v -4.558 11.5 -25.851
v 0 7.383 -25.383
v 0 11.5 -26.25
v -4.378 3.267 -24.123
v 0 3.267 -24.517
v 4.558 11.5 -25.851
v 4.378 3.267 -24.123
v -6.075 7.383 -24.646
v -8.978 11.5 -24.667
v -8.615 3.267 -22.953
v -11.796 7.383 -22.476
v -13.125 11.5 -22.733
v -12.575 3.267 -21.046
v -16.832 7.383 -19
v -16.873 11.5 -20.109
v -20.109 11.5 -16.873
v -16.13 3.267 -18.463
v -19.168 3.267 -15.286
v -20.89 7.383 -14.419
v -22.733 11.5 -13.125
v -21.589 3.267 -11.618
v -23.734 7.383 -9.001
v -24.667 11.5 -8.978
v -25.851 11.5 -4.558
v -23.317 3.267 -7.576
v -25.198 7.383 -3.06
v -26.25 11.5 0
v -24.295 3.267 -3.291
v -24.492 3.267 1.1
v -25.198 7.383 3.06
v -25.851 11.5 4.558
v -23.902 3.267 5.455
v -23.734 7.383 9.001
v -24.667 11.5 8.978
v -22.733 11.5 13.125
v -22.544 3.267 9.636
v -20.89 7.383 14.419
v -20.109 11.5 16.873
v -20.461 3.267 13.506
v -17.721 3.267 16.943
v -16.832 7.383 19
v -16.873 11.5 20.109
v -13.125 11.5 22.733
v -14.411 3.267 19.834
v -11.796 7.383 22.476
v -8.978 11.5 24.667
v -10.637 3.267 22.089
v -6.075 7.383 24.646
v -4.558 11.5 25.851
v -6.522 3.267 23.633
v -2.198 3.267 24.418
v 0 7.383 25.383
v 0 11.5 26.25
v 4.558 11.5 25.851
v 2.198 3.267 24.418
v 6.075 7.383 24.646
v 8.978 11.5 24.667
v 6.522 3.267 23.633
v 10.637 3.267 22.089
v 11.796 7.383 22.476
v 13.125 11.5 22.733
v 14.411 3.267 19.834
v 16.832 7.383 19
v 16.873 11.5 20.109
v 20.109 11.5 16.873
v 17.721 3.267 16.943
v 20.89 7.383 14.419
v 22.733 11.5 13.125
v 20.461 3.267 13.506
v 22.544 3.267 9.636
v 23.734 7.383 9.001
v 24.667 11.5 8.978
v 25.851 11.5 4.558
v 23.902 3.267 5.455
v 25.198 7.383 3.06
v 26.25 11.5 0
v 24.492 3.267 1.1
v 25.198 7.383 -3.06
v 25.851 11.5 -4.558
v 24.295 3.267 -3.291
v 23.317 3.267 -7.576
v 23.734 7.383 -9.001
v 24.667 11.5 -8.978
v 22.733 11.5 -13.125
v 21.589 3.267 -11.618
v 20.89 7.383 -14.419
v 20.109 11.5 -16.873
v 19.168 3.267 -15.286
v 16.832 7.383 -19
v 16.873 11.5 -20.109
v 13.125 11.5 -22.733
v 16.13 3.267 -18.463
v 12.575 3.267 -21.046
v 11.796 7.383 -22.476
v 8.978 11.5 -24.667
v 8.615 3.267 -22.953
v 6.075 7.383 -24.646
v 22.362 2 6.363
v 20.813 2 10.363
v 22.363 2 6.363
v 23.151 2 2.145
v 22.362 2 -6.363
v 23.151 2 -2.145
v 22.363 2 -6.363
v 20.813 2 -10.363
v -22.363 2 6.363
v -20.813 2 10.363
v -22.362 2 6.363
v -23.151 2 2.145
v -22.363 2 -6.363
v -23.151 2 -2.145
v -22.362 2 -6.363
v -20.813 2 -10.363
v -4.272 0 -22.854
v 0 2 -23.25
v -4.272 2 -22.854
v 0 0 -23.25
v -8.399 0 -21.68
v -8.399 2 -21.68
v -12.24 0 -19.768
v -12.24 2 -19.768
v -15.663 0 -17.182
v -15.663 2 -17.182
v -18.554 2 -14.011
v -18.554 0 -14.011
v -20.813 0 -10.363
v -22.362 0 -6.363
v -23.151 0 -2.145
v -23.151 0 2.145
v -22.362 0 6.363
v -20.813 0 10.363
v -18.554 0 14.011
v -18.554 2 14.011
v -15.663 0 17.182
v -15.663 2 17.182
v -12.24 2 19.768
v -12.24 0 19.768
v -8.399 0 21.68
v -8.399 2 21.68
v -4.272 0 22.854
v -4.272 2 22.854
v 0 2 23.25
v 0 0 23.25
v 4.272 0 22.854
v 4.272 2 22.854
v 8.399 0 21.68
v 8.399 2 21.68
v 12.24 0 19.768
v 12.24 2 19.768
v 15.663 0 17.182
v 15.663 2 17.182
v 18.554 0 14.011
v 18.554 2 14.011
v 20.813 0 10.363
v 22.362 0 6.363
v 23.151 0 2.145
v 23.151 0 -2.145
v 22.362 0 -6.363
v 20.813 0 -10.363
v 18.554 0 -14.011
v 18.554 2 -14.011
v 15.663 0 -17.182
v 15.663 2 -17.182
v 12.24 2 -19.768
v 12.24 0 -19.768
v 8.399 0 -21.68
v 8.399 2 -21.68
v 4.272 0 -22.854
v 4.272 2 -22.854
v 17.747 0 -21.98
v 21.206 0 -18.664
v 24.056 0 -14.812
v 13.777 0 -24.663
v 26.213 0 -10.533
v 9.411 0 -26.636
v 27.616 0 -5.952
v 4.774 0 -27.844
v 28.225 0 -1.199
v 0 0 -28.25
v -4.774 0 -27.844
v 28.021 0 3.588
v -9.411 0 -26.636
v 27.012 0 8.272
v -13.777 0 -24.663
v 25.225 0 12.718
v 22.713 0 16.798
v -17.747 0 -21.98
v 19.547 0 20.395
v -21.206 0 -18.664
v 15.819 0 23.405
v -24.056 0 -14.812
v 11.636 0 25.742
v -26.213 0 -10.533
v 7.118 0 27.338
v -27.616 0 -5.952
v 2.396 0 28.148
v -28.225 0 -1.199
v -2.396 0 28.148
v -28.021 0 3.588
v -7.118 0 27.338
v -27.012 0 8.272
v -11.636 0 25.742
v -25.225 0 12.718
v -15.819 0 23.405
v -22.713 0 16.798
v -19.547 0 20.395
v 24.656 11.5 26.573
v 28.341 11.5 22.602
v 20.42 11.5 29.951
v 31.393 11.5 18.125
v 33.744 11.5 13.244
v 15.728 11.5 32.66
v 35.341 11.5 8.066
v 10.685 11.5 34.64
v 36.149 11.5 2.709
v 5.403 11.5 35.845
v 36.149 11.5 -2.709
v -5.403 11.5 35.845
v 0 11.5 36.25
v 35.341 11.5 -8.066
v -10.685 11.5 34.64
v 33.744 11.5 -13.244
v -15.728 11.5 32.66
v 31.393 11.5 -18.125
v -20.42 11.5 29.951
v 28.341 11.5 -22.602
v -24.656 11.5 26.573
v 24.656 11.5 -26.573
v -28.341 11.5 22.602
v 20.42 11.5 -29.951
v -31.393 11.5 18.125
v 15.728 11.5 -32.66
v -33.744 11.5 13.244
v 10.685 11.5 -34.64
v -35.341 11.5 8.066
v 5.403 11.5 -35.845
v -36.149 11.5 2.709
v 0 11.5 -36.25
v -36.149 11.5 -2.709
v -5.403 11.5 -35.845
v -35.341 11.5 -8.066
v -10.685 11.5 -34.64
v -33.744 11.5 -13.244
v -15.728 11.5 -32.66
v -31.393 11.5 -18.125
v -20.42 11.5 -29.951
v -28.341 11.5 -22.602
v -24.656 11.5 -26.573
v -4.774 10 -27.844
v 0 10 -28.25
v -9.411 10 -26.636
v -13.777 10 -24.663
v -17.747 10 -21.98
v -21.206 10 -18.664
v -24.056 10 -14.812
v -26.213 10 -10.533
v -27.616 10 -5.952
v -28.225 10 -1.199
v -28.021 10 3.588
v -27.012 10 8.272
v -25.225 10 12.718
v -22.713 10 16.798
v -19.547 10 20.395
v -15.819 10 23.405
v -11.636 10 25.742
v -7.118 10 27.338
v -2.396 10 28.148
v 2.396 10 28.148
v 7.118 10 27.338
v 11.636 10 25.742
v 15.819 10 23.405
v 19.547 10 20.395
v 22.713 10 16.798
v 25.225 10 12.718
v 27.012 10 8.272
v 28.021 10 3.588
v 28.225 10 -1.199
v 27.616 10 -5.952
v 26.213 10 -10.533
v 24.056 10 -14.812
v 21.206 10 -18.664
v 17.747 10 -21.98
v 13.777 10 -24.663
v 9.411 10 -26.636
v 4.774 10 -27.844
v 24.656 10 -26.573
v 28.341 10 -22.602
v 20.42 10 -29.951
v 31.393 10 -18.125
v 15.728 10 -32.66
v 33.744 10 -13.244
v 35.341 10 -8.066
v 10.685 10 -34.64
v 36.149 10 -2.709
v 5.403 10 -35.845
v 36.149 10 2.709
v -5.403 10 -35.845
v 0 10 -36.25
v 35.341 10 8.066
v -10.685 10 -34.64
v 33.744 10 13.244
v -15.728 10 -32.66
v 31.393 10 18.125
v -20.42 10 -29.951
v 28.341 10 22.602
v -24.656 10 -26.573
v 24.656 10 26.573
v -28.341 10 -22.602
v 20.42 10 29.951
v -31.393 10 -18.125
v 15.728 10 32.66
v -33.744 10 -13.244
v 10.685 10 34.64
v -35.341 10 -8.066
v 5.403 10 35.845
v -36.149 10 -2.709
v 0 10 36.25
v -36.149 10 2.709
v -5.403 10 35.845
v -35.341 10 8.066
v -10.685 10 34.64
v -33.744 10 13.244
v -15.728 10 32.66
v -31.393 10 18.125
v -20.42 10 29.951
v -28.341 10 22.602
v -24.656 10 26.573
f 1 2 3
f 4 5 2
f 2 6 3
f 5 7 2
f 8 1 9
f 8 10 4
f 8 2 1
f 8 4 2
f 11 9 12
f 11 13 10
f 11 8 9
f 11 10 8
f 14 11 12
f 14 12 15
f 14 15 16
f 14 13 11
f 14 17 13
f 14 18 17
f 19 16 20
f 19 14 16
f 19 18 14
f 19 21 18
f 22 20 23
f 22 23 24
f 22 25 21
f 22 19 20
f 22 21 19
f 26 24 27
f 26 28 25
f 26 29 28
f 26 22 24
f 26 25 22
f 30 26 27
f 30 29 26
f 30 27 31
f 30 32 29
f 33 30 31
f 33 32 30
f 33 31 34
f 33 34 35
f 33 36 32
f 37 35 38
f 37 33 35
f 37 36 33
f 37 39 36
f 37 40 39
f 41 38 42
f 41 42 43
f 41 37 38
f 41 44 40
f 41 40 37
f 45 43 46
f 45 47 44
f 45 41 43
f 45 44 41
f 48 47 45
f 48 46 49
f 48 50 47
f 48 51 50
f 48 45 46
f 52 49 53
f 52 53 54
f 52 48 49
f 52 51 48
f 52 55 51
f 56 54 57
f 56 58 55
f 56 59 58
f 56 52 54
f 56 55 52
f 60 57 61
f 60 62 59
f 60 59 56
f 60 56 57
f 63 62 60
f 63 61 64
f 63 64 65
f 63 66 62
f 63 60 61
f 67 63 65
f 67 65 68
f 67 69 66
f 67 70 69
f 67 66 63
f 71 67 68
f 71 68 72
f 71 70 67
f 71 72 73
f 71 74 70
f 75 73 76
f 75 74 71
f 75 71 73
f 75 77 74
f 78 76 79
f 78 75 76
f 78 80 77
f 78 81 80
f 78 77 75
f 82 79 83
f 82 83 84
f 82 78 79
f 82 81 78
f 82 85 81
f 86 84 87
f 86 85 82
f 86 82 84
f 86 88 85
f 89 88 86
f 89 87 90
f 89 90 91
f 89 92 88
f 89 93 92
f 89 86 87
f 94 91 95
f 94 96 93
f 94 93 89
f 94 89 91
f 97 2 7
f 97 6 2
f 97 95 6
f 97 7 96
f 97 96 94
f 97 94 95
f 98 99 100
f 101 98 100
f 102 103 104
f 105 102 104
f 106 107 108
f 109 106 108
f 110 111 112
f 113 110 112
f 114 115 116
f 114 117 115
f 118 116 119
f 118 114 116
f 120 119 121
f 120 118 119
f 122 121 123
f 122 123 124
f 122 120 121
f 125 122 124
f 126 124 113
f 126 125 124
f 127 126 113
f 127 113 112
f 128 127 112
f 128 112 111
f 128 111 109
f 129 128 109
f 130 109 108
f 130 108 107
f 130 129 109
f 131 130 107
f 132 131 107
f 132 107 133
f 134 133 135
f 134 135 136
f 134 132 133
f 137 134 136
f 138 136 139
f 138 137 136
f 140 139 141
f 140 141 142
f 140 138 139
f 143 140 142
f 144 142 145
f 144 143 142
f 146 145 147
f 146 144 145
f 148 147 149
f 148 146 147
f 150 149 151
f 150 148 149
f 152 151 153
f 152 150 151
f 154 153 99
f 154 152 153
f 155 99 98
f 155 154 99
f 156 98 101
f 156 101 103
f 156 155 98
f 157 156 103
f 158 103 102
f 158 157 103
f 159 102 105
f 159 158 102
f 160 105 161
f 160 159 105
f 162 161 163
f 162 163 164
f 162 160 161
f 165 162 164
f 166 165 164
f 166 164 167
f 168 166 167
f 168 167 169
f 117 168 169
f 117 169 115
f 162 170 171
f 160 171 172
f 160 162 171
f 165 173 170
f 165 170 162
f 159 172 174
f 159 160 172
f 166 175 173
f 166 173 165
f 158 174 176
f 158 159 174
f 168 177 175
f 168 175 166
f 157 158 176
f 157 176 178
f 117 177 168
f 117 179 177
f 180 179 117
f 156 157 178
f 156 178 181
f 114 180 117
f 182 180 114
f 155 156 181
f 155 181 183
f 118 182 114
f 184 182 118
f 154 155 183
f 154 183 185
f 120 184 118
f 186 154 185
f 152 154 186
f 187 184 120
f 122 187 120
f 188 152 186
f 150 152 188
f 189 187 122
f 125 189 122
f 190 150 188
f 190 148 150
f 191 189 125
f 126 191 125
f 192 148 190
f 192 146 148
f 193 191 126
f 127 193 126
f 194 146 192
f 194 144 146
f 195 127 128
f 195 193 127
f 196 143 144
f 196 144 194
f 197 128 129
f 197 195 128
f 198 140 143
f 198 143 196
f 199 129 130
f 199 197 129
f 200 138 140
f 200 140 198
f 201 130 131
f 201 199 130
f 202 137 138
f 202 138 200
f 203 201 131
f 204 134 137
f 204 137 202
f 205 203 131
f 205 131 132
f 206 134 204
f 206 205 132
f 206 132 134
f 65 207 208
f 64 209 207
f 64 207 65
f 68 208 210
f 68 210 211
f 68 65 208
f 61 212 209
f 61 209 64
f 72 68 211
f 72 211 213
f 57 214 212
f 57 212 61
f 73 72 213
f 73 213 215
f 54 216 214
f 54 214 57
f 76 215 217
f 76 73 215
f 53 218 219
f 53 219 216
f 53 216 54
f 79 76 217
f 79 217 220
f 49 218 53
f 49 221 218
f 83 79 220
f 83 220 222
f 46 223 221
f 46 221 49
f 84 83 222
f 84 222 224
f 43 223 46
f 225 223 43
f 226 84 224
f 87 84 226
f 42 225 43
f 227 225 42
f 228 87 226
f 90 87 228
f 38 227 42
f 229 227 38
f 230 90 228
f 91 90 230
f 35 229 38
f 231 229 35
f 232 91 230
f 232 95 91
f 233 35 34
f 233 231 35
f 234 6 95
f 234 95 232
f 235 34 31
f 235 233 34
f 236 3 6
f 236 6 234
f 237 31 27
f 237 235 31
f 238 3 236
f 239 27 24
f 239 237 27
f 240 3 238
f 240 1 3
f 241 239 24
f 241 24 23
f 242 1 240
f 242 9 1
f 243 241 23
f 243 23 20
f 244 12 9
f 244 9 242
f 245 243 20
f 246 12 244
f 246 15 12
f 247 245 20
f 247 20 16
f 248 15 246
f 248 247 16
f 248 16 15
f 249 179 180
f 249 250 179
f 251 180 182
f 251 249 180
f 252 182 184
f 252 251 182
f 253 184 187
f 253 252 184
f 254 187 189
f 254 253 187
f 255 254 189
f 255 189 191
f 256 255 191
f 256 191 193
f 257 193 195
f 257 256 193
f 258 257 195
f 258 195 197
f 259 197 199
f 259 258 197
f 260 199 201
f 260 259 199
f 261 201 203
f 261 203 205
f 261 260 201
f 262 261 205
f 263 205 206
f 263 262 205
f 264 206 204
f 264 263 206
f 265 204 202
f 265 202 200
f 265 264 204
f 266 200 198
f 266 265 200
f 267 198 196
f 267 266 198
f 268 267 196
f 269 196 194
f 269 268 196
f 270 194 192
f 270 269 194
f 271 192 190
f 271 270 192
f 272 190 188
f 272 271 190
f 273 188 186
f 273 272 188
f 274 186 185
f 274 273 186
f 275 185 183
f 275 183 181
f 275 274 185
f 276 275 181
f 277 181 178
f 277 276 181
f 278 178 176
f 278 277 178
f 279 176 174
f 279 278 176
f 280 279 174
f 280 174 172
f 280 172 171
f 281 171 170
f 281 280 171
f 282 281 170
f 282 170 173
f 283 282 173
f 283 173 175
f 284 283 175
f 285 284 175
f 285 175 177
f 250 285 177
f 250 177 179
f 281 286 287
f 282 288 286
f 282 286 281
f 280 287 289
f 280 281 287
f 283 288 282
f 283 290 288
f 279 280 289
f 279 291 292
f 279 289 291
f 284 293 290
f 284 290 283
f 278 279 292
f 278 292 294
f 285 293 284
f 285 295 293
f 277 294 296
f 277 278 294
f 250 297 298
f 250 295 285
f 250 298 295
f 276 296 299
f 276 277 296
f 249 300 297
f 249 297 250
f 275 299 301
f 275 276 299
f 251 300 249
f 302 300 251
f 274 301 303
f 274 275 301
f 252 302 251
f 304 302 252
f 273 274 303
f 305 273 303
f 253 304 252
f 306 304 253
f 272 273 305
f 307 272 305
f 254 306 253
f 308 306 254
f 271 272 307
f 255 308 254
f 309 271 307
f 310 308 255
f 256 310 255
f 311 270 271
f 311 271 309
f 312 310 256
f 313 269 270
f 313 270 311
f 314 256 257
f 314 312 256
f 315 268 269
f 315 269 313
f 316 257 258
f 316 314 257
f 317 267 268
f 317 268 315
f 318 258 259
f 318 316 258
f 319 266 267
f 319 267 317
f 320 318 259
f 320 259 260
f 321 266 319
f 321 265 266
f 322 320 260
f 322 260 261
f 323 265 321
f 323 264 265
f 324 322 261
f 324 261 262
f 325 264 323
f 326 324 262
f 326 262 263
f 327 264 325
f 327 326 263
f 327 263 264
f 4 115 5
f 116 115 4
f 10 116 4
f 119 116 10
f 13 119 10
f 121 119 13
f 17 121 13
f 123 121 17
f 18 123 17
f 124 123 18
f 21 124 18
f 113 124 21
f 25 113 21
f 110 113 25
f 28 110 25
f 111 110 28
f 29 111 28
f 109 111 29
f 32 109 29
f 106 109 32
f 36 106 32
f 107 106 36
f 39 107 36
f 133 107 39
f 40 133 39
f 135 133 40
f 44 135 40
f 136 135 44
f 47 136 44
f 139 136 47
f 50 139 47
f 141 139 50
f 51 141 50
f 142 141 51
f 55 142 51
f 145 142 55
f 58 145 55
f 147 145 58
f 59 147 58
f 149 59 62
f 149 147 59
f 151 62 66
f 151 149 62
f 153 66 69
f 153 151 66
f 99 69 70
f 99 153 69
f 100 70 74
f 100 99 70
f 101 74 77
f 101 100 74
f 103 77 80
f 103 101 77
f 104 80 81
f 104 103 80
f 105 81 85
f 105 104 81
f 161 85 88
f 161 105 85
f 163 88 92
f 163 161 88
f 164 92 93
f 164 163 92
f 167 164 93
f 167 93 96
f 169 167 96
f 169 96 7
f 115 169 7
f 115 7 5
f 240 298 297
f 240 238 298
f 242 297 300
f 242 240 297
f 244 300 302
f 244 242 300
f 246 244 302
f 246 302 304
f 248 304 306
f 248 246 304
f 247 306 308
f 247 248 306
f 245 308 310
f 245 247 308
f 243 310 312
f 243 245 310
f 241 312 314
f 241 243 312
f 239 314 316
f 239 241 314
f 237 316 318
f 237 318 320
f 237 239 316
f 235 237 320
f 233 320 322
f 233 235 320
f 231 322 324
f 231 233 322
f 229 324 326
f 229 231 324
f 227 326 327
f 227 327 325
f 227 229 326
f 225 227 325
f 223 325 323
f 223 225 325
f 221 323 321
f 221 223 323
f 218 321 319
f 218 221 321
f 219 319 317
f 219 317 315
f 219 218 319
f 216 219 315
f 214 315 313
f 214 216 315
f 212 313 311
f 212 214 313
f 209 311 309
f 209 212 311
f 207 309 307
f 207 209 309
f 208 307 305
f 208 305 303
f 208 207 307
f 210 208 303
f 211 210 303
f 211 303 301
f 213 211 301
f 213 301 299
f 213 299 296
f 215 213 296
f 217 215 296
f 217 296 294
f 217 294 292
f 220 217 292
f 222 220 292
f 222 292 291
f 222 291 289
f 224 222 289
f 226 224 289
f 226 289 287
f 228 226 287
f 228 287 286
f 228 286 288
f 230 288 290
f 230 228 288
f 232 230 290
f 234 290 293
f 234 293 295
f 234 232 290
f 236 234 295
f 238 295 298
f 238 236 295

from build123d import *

# Parameters (mm, degrees)
CHAMFER1_SIZE2 = 1
CHAMFER1_SIZE  = 1.294432523


with BuildPart() as part:
    # Sketch2 → Revolve1 (revolve)
    with BuildSketch(Plane.XY, mode=Mode.PRIVATE) as revolve1_sk:
        Polygon((28.25, 0), (28.25, 10), (36.25, 10), (36.25, 11.5), (26.25, 11.5), (24.25, 2), (23.25, 2), (23.25, 0), align=None)
    revolve(revolve1_sk.sketch.rotate(Axis((0, 0, 0), (0, 1, 0)), 90), axis=Axis((0, 0, 0), (0, 1, 0)))

    # Chamfer1
    chamfer1_edges = [part.edges().sort_by_distance(p)[0] for p in [
        (0, 2, 24.25),
    ]]
    chamfer1_side = [part.faces().sort_by_distance(p)[0] for p in [
        (0, 2.019570996, 24.25412021),
    ]]
    chamfer(chamfer1_edges, length=CHAMFER1_SIZE - 0.0001, length2=CHAMFER1_SIZE2 - 0.0001, reference=chamfer1_side[0])  # a hair under: the kernel refuses the full size


solid = part.part
